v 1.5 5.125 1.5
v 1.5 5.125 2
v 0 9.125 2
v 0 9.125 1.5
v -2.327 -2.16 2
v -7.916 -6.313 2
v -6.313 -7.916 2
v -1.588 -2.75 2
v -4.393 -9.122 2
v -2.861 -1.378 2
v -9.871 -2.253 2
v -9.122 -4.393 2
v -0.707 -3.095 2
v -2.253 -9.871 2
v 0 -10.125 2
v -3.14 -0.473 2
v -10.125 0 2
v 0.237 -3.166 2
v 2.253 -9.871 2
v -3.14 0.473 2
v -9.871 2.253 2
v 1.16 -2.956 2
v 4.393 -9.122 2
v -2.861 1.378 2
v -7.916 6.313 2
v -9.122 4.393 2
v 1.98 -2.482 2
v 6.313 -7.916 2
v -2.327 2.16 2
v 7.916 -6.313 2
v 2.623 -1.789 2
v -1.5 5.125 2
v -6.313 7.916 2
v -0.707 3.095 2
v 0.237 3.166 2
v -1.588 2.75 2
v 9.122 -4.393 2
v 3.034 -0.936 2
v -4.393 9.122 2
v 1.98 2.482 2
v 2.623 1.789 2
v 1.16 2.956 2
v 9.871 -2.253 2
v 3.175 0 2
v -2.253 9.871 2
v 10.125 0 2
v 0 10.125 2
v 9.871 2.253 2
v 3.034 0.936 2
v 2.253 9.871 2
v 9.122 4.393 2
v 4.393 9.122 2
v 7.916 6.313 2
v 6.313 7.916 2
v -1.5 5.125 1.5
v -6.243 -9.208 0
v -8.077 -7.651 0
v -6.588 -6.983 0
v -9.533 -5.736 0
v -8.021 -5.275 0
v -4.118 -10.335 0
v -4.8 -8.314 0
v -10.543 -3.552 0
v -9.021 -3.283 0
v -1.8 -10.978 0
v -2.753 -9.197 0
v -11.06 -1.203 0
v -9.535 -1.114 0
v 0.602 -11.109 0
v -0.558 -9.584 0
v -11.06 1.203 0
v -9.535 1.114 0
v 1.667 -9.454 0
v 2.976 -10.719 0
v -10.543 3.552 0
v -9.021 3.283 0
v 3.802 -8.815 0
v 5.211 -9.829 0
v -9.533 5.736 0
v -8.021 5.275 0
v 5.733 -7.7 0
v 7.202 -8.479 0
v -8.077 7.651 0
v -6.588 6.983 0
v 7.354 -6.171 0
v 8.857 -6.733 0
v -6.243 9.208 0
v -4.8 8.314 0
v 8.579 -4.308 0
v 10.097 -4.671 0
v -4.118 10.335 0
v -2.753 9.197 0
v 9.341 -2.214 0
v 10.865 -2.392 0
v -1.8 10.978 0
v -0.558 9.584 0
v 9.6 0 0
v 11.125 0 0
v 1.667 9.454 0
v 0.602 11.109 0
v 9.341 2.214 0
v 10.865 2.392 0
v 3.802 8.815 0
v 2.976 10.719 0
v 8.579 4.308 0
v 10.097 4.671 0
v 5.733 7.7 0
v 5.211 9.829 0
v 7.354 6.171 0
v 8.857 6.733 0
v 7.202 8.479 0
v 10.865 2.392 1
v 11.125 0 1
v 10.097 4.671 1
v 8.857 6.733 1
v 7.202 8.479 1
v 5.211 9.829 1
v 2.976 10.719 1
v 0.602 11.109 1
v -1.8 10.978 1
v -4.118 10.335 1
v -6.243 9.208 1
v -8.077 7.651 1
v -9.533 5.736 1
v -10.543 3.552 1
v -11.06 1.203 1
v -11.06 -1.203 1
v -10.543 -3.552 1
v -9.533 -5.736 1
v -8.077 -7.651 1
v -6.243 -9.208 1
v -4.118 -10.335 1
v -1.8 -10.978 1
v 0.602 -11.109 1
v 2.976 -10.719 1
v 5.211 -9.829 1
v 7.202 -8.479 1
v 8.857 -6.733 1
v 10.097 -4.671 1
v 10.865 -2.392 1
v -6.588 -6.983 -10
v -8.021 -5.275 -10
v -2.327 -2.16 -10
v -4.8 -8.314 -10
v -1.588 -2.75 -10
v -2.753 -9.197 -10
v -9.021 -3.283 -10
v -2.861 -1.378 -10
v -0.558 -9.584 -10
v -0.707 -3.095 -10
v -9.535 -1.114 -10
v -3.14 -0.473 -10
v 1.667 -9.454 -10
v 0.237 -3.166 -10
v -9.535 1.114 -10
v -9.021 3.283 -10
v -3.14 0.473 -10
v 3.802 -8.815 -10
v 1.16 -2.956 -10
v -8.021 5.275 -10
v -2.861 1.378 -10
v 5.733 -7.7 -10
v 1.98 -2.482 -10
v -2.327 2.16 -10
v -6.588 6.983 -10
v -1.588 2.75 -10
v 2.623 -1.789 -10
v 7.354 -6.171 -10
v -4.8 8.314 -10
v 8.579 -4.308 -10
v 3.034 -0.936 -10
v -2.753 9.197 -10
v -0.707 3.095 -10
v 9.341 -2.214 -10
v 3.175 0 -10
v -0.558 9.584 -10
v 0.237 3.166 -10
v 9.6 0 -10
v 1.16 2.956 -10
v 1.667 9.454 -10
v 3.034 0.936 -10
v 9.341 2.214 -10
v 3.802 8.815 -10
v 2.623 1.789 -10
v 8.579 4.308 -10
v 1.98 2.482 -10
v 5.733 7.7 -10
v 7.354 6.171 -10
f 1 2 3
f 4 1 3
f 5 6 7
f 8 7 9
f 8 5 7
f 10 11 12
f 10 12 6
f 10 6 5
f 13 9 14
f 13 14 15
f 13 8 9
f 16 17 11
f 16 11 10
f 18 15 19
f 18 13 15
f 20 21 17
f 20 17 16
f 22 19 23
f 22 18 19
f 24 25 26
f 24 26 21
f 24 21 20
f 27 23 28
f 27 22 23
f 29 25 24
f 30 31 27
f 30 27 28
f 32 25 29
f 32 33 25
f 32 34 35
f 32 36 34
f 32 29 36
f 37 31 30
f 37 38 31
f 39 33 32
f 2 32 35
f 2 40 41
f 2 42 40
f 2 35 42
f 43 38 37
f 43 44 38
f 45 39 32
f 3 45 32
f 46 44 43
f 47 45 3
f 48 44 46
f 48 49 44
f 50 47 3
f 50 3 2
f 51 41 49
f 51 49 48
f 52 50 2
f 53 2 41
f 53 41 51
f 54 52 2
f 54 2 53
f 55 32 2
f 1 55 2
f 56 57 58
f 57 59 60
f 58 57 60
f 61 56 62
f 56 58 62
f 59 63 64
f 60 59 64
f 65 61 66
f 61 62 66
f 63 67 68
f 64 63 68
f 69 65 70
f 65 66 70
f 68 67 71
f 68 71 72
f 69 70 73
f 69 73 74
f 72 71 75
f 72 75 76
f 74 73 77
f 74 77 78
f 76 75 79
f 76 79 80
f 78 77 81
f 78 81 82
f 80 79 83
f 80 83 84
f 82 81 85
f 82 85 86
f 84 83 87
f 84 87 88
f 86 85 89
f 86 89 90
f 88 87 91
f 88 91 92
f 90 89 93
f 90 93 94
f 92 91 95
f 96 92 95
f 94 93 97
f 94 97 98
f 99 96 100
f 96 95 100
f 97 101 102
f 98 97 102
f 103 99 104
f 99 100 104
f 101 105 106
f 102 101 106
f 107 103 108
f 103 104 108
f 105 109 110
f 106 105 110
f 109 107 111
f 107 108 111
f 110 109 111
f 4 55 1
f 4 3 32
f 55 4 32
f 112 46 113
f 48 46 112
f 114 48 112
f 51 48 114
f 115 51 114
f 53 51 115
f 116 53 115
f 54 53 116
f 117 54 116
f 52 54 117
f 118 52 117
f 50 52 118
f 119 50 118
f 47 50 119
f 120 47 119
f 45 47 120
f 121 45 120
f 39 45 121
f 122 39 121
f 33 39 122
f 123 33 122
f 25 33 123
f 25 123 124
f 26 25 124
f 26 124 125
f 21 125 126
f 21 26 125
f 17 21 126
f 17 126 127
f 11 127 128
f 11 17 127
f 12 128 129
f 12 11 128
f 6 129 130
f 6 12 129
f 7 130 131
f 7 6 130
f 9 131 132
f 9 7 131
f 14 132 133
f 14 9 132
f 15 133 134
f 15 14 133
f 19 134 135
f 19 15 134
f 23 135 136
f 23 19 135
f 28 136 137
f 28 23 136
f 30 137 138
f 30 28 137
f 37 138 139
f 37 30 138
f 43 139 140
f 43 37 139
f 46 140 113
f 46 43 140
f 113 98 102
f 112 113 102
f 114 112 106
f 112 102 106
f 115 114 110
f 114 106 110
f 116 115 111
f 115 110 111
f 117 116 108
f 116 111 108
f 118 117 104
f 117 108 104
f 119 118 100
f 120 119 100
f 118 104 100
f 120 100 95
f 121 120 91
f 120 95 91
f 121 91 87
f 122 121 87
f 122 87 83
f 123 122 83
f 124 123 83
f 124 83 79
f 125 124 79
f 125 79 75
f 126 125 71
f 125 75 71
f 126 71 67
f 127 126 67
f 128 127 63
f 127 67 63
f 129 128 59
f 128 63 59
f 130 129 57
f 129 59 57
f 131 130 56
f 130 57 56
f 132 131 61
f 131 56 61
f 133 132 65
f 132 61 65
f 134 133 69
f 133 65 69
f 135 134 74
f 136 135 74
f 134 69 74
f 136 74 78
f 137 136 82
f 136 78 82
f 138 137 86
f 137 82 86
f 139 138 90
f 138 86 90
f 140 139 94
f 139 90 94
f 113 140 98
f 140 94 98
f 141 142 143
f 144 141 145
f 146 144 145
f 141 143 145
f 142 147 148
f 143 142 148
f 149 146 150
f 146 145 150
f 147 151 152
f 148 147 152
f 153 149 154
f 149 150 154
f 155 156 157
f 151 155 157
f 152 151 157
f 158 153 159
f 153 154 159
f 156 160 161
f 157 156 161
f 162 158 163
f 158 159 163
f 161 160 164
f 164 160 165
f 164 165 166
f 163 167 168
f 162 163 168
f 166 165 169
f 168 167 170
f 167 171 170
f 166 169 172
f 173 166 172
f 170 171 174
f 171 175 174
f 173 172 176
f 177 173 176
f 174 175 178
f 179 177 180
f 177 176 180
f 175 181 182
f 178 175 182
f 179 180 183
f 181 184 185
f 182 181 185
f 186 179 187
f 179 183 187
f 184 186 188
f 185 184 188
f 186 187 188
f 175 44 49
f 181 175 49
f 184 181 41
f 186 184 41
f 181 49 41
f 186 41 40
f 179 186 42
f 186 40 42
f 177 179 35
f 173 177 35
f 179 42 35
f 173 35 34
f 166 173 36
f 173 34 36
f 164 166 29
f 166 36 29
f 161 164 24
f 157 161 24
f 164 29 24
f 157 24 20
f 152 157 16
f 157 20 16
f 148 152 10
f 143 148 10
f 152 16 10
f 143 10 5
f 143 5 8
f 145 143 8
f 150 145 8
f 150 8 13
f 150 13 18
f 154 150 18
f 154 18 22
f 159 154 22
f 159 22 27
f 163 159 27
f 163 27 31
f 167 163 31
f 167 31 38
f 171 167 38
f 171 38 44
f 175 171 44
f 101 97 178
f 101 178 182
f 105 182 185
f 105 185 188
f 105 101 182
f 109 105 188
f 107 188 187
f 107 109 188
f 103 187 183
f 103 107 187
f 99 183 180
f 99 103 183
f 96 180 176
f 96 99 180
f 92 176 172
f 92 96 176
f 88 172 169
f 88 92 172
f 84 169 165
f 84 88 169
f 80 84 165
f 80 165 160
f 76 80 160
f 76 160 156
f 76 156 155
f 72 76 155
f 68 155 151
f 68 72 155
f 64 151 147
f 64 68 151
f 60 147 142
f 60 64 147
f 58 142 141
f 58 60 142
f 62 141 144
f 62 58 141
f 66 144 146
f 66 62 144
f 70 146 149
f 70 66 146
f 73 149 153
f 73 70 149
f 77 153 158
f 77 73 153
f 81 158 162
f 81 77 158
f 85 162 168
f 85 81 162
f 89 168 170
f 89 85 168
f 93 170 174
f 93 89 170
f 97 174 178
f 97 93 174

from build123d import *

# Parameters (mm, degrees)
F0_R     = 9.6
F1_DEPTH = 10
F3_R     = 11.125
F4_DEPTH = 2
F5_SIZE  = 1
F6_R     = 3.175
F7_DEPTH = 12.001
F9_DEPTH = 0.5


with BuildPart() as f1:
    # F0 (on Top) → F1 (new body)
    with BuildSketch(Plane.XY):
        Circle(F0_R)
    extrude(amount=-F1_DEPTH)

    # F3 (on face) → F4 (join)
    with BuildSketch(Plane.XY):
        Circle(F3_R)
    extrude(amount=F4_DEPTH)

    # F5
    f5_edges = [f1.edges().sort_by_distance(p)[0] for p in [
        (-11.125, 0, 2),
    ]]
    chamfer(f5_edges, length=F5_SIZE)

    # F6 (on face) → F7 (cut, through all)
    with BuildSketch(Plane.XY.offset(2)):
        Circle(F6_R)
    extrude(amount=-F7_DEPTH, mode=Mode.SUBTRACT)

    # F8 (on face) → F9 (cut)
    with BuildSketch(Plane.XY.offset(2)):
        Polygon((1.5, 5.125), (0, 9.125), (-1.5, 5.125), align=None)
    extrude(amount=-F9_DEPTH, mode=Mode.SUBTRACT)


solid = f1.part
